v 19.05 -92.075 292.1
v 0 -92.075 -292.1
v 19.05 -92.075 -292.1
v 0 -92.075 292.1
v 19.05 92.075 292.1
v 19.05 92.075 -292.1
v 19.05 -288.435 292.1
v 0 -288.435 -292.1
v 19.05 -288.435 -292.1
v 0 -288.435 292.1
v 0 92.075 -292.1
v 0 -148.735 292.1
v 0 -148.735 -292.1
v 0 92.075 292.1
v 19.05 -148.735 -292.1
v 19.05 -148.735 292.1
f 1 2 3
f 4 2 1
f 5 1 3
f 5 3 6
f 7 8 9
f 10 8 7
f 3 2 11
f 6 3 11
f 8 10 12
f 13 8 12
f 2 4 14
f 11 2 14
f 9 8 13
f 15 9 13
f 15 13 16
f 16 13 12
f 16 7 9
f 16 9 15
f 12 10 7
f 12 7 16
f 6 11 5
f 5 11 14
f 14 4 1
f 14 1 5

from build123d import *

# Parameters (mm, degrees)
F0_W     = 184.15
F0_H     = 584.2
F1_DEPTH = 19.05
F2_W     = 139.7
F2_H     = 584.2
F3_DEPTH = 19.05


with BuildPart() as f1:
    # F0 (on Right) → F1 (new body)
    with BuildSketch(Plane.YZ):
        Rectangle(F0_W, F0_H)
    extrude(amount=F1_DEPTH)


with BuildPart() as f3:
    # F2 (on Right) → F3 (new body)
    with BuildSketch(Plane.YZ):
        with Locations((-218.584901, 0)):
            Rectangle(F2_W, F2_H)
    extrude(amount=F3_DEPTH)


solid = Compound([f1.part, f3.part])
